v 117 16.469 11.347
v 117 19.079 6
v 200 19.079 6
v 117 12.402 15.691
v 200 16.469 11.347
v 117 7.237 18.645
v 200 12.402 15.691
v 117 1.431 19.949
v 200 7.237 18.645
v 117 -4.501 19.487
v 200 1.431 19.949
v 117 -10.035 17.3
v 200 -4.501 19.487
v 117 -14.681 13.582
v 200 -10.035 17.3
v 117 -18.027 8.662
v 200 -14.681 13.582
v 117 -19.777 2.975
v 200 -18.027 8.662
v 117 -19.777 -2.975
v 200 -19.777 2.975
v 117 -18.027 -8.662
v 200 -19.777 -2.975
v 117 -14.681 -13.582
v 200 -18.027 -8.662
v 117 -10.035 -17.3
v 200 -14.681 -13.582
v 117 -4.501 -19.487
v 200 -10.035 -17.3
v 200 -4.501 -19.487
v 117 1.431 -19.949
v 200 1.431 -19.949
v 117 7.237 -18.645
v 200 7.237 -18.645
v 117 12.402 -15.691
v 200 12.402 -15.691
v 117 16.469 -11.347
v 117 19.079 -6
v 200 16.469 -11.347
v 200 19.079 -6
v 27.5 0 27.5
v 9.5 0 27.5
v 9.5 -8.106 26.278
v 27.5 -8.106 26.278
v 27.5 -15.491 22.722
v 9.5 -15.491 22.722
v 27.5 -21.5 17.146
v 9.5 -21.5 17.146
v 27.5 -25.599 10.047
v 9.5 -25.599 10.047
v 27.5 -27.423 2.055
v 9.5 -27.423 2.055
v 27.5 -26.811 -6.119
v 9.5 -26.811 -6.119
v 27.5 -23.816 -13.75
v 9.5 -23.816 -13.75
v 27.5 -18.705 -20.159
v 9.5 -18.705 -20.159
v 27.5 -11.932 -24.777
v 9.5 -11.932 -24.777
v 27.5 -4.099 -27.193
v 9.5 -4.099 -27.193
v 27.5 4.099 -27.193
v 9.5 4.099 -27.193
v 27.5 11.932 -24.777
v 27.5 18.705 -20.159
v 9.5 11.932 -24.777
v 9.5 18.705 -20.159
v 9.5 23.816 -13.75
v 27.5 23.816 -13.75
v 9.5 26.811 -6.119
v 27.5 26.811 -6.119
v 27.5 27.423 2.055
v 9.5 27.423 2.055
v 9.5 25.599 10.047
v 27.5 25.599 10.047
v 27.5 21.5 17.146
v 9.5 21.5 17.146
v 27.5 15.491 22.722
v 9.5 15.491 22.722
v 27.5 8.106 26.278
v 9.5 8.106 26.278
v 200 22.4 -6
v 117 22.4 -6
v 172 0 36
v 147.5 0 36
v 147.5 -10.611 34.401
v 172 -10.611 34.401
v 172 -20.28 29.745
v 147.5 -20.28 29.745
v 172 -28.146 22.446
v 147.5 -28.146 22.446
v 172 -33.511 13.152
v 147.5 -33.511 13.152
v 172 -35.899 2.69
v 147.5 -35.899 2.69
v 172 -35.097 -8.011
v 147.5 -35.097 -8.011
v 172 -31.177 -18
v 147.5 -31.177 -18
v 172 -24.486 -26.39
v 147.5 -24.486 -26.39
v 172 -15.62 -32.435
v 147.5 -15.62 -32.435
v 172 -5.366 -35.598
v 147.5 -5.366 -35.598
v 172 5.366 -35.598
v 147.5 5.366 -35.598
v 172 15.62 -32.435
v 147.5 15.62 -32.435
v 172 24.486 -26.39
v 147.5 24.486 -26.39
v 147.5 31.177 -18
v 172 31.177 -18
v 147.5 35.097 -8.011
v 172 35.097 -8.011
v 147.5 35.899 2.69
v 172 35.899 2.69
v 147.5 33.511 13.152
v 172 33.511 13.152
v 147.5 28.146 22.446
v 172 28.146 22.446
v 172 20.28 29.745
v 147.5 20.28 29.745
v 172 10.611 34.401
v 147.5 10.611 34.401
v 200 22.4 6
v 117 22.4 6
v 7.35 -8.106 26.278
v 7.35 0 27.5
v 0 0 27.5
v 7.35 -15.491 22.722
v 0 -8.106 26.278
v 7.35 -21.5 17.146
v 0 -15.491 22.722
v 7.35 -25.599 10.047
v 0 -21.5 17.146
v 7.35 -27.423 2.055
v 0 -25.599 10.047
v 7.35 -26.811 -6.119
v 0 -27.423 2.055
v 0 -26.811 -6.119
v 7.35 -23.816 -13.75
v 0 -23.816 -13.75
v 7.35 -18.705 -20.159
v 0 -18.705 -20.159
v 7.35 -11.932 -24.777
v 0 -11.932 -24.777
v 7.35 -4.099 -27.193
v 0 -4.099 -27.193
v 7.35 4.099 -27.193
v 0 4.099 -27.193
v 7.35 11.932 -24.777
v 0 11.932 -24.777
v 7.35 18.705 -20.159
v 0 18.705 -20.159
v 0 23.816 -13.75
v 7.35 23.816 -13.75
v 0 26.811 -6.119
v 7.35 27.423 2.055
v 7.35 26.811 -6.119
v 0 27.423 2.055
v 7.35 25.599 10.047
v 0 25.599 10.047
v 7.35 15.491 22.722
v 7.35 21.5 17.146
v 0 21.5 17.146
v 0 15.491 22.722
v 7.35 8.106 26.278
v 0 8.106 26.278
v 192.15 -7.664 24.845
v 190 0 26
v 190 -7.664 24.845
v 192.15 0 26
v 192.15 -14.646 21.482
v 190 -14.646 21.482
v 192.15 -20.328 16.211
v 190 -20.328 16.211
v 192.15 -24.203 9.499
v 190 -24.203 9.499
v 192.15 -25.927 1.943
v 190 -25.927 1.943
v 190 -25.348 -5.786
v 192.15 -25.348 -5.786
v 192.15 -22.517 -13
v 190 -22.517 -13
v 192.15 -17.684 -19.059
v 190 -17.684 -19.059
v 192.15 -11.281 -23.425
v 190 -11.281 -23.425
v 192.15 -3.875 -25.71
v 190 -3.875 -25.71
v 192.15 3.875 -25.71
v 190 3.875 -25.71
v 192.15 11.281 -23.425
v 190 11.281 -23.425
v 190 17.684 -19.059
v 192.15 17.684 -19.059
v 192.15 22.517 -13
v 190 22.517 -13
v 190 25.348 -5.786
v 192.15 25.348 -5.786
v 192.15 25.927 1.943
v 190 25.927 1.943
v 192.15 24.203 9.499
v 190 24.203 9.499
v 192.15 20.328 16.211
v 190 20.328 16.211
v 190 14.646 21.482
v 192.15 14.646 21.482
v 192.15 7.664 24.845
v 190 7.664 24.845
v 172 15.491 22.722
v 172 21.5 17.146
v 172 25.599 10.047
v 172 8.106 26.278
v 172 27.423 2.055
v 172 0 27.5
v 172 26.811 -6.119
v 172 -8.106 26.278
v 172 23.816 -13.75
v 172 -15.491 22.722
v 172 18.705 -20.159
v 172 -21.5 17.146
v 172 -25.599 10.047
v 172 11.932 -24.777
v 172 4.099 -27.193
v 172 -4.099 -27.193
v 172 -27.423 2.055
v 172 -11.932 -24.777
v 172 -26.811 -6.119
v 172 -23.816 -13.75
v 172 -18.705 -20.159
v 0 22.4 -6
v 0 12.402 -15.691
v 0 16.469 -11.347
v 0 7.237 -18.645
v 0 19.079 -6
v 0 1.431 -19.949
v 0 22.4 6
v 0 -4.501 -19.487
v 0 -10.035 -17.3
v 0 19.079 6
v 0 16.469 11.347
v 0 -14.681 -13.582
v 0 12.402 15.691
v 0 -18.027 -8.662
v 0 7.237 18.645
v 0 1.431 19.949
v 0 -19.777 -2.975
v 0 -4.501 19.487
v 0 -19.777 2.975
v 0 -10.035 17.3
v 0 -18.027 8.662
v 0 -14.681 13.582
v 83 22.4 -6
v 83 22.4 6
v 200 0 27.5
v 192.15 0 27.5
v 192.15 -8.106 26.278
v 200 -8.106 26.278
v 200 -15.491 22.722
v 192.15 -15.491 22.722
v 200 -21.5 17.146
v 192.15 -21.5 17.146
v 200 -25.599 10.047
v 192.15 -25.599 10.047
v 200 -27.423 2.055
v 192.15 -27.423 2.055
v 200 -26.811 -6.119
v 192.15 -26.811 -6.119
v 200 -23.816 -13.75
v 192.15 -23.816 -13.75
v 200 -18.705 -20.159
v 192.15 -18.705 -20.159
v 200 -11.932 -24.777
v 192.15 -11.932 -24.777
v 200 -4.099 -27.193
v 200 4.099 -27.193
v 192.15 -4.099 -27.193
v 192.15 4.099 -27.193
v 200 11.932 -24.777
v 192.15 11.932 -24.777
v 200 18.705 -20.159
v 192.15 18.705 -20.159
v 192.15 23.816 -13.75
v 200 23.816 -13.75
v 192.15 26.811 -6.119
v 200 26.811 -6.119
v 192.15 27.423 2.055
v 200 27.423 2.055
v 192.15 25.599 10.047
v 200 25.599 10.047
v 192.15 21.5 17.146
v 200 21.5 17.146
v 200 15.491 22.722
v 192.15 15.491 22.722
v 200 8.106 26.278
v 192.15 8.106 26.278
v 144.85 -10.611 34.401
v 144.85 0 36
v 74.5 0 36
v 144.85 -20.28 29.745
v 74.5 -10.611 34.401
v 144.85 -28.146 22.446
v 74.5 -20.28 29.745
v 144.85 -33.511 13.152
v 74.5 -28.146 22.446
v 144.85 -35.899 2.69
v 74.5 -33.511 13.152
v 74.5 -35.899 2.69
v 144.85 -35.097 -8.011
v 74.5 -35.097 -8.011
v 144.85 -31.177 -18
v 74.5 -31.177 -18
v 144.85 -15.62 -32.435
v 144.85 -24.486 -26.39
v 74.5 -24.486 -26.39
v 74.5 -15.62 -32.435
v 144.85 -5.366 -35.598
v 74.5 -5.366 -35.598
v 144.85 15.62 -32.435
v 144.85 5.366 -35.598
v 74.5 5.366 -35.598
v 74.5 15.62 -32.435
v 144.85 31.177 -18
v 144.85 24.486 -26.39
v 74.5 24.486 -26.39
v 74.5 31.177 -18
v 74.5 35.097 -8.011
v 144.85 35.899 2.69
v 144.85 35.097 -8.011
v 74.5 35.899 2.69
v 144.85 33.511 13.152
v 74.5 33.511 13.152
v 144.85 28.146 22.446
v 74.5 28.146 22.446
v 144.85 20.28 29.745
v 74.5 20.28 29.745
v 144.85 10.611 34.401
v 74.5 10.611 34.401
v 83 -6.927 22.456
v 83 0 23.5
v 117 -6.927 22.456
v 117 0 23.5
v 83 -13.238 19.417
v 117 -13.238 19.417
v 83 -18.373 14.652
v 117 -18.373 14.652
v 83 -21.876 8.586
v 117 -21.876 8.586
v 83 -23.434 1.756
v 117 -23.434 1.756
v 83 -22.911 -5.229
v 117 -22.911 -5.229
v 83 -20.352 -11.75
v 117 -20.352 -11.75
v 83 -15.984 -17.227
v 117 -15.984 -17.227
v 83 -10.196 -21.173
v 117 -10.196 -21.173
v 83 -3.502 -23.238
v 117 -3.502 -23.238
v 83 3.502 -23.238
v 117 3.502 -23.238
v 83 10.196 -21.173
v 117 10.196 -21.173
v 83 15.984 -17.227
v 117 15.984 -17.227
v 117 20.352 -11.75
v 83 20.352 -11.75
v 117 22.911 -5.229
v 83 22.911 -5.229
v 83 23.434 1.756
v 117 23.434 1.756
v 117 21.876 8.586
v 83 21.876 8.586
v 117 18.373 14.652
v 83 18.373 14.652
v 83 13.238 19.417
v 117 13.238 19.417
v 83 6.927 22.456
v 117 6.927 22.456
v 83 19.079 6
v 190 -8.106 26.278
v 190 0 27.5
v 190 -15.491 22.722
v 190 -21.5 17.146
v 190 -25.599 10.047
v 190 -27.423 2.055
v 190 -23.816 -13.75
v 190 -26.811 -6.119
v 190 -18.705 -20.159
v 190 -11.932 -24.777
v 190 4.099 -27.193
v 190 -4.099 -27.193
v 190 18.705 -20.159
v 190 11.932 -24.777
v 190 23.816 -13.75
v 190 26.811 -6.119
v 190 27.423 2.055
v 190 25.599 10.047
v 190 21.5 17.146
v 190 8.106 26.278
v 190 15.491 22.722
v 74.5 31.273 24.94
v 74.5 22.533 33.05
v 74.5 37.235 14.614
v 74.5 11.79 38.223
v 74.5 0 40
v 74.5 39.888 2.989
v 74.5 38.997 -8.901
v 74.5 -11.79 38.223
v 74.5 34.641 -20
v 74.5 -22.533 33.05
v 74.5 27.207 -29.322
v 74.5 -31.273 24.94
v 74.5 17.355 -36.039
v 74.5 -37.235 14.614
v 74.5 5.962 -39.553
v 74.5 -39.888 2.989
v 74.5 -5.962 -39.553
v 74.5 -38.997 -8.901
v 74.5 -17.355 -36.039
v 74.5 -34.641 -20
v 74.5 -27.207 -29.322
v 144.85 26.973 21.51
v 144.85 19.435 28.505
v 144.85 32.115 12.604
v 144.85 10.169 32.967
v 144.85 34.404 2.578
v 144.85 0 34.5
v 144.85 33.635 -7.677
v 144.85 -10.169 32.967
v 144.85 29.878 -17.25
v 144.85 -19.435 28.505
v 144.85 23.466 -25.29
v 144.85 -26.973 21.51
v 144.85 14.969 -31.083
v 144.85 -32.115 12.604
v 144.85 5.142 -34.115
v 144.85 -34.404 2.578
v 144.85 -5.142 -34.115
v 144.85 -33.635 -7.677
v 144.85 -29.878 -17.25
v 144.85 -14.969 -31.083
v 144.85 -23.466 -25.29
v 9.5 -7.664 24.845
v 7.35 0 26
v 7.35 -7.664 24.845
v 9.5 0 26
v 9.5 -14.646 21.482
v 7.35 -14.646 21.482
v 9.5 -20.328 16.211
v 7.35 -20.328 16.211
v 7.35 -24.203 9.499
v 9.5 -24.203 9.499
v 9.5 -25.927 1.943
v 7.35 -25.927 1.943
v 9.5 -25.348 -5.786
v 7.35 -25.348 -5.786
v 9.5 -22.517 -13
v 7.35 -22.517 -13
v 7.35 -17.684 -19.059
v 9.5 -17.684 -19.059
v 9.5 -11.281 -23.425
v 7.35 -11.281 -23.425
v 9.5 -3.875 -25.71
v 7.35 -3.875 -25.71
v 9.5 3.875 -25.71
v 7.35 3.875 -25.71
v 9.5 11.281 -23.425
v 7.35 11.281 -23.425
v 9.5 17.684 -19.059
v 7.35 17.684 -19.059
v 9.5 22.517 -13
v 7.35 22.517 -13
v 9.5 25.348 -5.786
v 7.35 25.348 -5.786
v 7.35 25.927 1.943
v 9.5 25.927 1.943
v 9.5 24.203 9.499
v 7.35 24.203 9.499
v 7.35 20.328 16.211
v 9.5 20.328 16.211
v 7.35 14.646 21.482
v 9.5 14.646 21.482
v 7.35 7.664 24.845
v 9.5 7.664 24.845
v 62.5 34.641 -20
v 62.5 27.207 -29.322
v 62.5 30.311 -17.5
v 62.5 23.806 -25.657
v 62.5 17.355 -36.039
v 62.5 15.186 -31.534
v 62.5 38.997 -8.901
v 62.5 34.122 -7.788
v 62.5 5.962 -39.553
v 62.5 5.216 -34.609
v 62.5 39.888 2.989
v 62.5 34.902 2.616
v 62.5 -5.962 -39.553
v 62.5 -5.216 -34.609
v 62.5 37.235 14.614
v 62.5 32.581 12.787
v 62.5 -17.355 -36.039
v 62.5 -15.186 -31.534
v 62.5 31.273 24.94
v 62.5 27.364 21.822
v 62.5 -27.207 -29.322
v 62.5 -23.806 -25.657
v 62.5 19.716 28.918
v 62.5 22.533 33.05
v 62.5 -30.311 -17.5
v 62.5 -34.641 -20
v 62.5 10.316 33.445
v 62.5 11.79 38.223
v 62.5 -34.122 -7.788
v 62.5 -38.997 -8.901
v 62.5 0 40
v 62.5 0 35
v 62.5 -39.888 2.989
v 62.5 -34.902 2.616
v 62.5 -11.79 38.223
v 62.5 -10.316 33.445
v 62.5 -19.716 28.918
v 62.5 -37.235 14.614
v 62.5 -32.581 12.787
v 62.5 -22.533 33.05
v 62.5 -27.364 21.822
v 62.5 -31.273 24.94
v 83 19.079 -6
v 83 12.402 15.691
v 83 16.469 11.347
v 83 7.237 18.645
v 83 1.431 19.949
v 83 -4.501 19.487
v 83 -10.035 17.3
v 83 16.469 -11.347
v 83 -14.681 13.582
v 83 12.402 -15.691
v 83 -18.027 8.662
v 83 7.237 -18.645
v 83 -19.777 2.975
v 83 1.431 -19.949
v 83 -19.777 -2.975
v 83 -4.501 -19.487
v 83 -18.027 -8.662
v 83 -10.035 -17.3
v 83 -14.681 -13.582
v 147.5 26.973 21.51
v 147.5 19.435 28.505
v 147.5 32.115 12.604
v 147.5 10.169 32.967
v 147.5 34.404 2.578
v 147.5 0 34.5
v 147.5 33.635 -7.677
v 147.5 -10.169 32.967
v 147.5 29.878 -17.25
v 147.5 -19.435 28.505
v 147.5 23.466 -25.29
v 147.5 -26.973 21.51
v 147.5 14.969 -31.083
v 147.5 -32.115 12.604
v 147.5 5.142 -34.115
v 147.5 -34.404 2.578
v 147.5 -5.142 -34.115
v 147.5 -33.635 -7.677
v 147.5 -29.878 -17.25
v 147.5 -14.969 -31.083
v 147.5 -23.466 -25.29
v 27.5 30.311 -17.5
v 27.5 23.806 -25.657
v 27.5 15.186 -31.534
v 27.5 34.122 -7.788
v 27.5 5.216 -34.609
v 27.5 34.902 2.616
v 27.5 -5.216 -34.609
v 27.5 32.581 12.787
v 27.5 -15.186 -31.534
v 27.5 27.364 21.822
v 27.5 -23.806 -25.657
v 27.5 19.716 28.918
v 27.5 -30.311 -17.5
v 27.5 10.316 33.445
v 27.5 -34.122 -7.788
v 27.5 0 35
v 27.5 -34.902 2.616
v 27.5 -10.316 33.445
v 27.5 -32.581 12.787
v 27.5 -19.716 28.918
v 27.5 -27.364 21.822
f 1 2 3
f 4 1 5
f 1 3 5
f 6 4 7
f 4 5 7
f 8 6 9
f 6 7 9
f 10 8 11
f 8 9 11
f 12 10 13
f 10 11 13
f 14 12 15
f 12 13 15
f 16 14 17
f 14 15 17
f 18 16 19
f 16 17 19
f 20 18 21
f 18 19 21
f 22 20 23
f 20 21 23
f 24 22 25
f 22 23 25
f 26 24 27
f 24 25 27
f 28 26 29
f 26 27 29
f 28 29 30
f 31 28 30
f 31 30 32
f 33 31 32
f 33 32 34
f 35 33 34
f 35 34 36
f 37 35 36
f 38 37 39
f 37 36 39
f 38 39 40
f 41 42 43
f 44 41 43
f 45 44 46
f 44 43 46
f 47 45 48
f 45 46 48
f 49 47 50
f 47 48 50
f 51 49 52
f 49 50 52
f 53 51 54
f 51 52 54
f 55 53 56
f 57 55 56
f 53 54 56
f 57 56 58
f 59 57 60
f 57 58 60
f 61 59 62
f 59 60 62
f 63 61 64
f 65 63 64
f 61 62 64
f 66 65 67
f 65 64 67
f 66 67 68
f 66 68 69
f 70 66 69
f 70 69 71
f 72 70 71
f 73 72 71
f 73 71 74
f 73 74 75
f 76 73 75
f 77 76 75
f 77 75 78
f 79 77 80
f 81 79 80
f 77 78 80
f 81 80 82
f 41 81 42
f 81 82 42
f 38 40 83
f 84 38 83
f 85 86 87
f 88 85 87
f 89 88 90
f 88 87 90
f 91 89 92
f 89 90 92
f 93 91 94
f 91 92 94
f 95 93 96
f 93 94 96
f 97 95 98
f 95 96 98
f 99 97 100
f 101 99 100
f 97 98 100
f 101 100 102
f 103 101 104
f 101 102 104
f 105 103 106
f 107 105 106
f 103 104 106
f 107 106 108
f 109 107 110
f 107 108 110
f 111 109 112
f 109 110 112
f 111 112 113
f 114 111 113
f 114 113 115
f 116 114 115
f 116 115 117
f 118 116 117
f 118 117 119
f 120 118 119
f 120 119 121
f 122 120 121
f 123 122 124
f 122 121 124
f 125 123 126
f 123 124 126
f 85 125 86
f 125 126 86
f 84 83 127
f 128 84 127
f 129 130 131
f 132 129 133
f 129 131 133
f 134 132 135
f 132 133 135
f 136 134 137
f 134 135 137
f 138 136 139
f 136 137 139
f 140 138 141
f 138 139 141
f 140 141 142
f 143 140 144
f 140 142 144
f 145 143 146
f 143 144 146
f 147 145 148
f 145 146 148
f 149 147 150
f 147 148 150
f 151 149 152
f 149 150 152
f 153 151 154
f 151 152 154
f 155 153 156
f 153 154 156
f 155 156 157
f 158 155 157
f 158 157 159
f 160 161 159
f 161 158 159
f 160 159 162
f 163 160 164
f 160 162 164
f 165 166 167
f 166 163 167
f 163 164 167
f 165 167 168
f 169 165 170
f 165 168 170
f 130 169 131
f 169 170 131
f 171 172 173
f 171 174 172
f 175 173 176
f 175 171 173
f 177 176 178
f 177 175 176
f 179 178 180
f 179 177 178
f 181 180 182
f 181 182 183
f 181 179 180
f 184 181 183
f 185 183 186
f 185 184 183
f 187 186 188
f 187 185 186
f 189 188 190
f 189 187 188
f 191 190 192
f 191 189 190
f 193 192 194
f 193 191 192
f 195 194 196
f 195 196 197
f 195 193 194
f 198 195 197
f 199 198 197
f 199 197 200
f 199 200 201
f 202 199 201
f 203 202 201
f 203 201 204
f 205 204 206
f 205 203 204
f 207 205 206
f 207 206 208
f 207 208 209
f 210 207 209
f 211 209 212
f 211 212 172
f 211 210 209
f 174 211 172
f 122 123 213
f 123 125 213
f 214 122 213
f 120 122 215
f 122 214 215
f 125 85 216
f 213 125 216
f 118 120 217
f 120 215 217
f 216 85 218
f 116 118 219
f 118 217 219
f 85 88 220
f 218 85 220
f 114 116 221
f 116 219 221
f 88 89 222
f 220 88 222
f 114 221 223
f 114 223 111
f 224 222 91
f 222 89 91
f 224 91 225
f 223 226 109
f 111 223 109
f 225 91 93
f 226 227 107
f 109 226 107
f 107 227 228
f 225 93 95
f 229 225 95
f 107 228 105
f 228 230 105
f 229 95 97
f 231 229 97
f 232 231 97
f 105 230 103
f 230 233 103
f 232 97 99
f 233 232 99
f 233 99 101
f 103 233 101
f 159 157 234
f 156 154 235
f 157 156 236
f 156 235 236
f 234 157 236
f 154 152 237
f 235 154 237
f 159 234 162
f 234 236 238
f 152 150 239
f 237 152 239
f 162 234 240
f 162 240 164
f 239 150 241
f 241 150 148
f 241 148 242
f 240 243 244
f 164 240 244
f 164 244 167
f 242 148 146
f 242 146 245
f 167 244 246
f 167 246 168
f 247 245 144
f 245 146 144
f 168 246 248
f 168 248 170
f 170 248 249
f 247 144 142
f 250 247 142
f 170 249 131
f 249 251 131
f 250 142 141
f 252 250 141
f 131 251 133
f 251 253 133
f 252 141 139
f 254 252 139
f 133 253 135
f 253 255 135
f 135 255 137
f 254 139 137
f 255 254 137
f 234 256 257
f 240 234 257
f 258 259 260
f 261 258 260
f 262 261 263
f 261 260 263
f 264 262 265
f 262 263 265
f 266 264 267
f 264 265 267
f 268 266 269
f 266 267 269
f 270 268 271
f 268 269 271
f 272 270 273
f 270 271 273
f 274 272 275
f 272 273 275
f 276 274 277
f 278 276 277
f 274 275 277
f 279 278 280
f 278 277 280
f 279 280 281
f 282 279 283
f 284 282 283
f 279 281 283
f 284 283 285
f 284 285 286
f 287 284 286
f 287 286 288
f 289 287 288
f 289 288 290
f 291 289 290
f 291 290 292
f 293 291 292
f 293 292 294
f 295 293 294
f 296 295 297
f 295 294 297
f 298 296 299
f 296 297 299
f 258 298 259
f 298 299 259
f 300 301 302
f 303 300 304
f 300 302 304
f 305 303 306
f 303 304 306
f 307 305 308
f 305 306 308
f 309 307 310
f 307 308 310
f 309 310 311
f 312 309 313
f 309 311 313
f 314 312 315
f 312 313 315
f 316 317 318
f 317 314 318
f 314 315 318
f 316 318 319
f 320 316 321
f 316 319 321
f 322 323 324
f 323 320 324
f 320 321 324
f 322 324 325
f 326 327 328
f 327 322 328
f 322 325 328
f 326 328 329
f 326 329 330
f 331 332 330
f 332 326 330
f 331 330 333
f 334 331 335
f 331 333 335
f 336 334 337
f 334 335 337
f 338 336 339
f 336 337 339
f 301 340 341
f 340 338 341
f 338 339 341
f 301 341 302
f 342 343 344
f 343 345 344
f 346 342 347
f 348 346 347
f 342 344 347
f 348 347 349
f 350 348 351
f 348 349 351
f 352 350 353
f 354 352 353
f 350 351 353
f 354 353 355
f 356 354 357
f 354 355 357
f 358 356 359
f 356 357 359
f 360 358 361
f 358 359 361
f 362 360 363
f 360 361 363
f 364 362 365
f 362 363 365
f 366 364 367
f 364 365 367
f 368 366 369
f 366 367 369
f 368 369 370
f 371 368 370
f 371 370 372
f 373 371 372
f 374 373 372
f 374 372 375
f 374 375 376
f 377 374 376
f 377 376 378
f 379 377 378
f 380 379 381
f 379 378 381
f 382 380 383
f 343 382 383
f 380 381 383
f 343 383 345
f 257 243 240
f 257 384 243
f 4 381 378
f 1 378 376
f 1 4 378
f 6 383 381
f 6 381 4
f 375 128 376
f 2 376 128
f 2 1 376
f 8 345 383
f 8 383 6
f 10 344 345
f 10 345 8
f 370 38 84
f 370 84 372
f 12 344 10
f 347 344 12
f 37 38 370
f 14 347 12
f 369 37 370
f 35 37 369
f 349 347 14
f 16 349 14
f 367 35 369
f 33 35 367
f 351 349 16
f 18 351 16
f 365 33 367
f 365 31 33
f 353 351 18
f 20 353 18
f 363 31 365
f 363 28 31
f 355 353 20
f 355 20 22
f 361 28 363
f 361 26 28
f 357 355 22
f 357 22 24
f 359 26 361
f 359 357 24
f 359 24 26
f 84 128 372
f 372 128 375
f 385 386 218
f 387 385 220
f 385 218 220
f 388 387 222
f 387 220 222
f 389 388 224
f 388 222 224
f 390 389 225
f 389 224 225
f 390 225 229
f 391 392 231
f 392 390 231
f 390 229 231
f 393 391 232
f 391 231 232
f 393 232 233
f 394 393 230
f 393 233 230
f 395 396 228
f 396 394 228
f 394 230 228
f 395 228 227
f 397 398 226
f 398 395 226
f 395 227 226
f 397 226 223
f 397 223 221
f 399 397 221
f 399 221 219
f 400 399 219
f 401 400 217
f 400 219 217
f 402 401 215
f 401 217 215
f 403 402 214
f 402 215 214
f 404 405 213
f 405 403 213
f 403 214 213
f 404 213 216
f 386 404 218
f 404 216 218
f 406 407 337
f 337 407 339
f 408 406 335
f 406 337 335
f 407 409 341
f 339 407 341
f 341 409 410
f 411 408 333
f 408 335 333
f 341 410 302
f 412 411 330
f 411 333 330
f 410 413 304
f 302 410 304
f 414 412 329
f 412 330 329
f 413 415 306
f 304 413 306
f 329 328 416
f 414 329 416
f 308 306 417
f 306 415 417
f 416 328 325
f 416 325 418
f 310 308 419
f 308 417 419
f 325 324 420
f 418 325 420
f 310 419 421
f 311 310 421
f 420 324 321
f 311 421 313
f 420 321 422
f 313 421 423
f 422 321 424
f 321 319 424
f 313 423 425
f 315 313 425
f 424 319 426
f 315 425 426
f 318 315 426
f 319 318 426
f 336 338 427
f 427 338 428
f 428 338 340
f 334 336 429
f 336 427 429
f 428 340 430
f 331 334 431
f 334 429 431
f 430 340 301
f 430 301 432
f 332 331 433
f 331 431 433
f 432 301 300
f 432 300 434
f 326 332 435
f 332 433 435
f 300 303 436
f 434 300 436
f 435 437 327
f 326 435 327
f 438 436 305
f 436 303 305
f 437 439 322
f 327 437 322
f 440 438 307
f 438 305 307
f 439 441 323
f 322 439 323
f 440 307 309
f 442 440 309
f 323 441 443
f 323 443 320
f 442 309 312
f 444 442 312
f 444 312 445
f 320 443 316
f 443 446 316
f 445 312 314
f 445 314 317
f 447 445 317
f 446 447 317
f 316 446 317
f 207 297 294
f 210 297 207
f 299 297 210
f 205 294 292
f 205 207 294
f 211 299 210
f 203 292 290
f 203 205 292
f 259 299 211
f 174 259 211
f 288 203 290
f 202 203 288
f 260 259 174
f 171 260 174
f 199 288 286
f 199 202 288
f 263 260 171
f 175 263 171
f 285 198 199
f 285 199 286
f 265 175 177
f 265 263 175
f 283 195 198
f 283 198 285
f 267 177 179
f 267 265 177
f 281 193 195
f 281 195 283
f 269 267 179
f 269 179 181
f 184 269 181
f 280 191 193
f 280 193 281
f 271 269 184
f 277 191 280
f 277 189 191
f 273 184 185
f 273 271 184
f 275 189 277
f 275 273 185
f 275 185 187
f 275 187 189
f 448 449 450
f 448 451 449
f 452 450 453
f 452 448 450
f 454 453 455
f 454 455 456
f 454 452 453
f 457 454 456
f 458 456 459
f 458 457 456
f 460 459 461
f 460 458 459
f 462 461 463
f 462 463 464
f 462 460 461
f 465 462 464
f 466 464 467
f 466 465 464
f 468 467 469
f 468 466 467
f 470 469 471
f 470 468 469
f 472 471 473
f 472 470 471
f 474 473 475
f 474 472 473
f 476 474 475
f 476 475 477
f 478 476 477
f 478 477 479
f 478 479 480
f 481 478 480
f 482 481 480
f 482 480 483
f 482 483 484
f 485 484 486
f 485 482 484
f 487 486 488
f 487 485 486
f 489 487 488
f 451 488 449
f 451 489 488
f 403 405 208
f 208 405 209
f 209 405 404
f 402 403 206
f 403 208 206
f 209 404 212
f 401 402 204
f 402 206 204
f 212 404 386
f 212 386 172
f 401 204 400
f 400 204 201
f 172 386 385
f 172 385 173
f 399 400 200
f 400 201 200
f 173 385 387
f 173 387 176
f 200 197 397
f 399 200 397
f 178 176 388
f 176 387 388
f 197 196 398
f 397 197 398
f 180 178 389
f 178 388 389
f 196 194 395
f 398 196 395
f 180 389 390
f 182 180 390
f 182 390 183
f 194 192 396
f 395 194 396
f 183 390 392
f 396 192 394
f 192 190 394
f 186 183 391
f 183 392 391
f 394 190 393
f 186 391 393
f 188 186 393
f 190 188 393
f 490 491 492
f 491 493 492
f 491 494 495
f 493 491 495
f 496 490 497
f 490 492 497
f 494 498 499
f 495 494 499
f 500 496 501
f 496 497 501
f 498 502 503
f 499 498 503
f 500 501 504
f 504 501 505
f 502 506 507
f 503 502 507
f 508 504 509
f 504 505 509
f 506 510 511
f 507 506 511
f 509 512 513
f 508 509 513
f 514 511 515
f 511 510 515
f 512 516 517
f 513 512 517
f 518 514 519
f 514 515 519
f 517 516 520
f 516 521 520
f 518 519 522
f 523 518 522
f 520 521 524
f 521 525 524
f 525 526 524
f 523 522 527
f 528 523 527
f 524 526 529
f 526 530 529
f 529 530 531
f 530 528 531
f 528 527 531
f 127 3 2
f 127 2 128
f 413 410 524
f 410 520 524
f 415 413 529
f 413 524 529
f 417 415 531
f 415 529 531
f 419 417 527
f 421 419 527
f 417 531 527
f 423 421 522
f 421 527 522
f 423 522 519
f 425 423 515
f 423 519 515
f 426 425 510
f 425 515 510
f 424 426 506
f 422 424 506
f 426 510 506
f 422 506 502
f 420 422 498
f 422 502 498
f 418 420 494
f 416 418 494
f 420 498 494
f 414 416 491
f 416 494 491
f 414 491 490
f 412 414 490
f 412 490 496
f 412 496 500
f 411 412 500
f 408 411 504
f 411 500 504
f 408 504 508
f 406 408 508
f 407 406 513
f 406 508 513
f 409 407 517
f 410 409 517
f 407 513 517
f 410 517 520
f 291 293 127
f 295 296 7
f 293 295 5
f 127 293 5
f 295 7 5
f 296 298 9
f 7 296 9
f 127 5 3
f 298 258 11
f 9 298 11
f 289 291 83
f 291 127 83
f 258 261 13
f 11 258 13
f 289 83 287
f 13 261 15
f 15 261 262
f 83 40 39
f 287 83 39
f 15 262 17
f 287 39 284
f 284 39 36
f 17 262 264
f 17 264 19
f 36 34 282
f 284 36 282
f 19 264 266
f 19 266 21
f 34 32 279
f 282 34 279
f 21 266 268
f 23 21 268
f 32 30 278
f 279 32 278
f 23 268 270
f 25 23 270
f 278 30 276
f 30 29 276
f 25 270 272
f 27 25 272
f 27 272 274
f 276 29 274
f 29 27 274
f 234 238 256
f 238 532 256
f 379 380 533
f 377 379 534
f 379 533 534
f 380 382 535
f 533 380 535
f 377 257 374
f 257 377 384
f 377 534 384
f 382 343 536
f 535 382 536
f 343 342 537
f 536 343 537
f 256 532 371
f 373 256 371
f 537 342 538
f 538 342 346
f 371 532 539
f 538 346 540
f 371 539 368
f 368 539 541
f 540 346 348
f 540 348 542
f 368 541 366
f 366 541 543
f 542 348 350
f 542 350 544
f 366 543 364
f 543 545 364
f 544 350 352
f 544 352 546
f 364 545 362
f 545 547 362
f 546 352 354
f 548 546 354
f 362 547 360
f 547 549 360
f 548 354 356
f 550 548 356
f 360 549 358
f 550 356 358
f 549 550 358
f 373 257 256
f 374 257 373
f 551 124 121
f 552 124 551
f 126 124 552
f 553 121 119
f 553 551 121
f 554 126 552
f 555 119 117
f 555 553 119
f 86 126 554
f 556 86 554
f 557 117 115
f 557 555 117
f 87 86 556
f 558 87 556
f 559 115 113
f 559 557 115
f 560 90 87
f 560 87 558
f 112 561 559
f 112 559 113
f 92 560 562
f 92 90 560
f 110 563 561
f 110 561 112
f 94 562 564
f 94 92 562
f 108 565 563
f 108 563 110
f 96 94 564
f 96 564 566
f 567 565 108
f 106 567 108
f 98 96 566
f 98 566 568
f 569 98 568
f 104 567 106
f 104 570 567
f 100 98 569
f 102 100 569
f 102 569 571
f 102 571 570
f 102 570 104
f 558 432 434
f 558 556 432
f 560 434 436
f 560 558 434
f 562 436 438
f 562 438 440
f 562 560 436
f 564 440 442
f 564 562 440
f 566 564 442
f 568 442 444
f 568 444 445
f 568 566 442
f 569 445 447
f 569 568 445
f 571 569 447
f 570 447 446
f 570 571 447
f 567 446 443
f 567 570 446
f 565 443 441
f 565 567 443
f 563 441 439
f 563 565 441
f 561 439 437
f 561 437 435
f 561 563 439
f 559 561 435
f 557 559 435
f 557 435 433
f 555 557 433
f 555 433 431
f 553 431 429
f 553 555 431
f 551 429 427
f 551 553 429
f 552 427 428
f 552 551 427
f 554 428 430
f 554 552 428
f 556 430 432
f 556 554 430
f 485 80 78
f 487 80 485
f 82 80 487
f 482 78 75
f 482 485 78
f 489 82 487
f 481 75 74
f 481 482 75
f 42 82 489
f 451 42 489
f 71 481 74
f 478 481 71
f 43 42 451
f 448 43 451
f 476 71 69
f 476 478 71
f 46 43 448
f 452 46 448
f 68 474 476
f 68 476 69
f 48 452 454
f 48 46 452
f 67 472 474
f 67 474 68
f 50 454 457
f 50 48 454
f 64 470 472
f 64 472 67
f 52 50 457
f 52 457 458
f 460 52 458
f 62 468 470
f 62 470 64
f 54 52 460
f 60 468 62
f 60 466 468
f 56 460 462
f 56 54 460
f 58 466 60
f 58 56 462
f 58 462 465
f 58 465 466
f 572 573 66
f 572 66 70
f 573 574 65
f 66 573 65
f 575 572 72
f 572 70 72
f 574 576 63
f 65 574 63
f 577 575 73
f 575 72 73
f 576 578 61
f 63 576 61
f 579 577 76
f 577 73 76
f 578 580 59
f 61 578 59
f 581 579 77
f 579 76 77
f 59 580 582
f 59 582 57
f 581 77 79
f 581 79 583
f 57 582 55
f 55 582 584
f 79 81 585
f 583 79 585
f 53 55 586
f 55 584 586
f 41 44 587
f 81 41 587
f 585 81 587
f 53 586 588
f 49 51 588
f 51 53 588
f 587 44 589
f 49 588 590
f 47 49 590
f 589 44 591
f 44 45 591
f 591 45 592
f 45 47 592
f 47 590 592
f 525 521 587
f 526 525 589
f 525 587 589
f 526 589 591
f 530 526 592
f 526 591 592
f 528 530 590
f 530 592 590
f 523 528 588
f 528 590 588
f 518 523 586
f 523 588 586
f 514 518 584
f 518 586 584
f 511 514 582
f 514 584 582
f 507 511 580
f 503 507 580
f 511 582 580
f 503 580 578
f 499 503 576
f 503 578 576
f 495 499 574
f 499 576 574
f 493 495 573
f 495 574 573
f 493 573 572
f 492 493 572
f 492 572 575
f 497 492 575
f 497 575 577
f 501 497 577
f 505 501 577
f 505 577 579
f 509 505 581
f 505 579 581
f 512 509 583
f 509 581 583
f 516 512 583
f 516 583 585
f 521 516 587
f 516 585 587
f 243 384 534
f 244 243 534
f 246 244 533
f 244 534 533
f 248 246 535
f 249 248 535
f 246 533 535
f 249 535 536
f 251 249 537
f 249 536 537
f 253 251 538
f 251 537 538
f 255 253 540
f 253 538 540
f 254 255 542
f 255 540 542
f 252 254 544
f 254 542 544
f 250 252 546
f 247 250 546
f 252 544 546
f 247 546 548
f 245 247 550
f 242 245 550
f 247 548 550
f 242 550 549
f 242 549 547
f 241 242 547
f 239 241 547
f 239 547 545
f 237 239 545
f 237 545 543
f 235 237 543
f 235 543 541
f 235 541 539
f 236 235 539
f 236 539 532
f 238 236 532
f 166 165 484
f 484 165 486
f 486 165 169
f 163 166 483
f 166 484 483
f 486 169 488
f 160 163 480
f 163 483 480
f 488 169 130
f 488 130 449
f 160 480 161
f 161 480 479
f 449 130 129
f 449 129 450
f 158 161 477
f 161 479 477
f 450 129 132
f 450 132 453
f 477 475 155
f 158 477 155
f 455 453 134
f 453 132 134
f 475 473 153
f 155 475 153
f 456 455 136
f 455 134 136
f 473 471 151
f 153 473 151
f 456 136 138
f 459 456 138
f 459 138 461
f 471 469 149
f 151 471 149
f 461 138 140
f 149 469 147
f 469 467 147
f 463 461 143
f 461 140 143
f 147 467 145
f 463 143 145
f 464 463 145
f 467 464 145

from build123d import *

# Parameters (mm, degrees)
F2_W     = 34
F2_H     = 23.5
F4_W     = 10
F4_H     = 12
F5_DEPTH = 200.001
F6_W     = 2.15
F6_H     = 10
F6_W_2   = 2.65


with BuildPart() as f1:
    # F0 (on Front) → F1 (revolve)
    with BuildSketch(Plane.XZ):
        Polygon((0, 27.5), (0, 20), (200, 20), (200, 27.5), (172, 27.5), (172, 36), (74.5, 36), (74.5, 40), (62.5, 40), (62.5, 35), (27.5, 35), (27.5, 27.5), align=None)
    revolve(axis=Axis((44.474047, 0, 0), (1, 0, 0)))

    # F2 (on Front) → F3 (revolve, cut)
    with BuildSketch(Plane.XZ):
        with Locations((100, 11.75)):
            Rectangle(F2_W, F2_H)
    revolve(axis=Axis((100, 0, 0), (1, 0, 0)), mode=Mode.SUBTRACT)

    # F4 (on face) → F5 (cut, through all)
    with BuildSketch(Plane.YZ.offset(200)):
        with Locations((17.4, 0)):
            Rectangle(F4_W, F4_H)
    extrude(amount=-F5_DEPTH, mode=Mode.SUBTRACT)

    # F6 (on Front) → F7 (revolve, cut)
    with BuildSketch(Plane.XZ):
        with Locations((8.425, 31)):
            Rectangle(F6_W, F6_H)
        with Locations((191.075, 31)):
            Rectangle(F6_W, F6_H)
        with Locations((146.175, 39.5)):
            Rectangle(F6_W_2, F6_H)
    revolve(axis=Axis((18.830039, 0, 0), (1, 0, 0)), mode=Mode.SUBTRACT)


solid = f1.part
